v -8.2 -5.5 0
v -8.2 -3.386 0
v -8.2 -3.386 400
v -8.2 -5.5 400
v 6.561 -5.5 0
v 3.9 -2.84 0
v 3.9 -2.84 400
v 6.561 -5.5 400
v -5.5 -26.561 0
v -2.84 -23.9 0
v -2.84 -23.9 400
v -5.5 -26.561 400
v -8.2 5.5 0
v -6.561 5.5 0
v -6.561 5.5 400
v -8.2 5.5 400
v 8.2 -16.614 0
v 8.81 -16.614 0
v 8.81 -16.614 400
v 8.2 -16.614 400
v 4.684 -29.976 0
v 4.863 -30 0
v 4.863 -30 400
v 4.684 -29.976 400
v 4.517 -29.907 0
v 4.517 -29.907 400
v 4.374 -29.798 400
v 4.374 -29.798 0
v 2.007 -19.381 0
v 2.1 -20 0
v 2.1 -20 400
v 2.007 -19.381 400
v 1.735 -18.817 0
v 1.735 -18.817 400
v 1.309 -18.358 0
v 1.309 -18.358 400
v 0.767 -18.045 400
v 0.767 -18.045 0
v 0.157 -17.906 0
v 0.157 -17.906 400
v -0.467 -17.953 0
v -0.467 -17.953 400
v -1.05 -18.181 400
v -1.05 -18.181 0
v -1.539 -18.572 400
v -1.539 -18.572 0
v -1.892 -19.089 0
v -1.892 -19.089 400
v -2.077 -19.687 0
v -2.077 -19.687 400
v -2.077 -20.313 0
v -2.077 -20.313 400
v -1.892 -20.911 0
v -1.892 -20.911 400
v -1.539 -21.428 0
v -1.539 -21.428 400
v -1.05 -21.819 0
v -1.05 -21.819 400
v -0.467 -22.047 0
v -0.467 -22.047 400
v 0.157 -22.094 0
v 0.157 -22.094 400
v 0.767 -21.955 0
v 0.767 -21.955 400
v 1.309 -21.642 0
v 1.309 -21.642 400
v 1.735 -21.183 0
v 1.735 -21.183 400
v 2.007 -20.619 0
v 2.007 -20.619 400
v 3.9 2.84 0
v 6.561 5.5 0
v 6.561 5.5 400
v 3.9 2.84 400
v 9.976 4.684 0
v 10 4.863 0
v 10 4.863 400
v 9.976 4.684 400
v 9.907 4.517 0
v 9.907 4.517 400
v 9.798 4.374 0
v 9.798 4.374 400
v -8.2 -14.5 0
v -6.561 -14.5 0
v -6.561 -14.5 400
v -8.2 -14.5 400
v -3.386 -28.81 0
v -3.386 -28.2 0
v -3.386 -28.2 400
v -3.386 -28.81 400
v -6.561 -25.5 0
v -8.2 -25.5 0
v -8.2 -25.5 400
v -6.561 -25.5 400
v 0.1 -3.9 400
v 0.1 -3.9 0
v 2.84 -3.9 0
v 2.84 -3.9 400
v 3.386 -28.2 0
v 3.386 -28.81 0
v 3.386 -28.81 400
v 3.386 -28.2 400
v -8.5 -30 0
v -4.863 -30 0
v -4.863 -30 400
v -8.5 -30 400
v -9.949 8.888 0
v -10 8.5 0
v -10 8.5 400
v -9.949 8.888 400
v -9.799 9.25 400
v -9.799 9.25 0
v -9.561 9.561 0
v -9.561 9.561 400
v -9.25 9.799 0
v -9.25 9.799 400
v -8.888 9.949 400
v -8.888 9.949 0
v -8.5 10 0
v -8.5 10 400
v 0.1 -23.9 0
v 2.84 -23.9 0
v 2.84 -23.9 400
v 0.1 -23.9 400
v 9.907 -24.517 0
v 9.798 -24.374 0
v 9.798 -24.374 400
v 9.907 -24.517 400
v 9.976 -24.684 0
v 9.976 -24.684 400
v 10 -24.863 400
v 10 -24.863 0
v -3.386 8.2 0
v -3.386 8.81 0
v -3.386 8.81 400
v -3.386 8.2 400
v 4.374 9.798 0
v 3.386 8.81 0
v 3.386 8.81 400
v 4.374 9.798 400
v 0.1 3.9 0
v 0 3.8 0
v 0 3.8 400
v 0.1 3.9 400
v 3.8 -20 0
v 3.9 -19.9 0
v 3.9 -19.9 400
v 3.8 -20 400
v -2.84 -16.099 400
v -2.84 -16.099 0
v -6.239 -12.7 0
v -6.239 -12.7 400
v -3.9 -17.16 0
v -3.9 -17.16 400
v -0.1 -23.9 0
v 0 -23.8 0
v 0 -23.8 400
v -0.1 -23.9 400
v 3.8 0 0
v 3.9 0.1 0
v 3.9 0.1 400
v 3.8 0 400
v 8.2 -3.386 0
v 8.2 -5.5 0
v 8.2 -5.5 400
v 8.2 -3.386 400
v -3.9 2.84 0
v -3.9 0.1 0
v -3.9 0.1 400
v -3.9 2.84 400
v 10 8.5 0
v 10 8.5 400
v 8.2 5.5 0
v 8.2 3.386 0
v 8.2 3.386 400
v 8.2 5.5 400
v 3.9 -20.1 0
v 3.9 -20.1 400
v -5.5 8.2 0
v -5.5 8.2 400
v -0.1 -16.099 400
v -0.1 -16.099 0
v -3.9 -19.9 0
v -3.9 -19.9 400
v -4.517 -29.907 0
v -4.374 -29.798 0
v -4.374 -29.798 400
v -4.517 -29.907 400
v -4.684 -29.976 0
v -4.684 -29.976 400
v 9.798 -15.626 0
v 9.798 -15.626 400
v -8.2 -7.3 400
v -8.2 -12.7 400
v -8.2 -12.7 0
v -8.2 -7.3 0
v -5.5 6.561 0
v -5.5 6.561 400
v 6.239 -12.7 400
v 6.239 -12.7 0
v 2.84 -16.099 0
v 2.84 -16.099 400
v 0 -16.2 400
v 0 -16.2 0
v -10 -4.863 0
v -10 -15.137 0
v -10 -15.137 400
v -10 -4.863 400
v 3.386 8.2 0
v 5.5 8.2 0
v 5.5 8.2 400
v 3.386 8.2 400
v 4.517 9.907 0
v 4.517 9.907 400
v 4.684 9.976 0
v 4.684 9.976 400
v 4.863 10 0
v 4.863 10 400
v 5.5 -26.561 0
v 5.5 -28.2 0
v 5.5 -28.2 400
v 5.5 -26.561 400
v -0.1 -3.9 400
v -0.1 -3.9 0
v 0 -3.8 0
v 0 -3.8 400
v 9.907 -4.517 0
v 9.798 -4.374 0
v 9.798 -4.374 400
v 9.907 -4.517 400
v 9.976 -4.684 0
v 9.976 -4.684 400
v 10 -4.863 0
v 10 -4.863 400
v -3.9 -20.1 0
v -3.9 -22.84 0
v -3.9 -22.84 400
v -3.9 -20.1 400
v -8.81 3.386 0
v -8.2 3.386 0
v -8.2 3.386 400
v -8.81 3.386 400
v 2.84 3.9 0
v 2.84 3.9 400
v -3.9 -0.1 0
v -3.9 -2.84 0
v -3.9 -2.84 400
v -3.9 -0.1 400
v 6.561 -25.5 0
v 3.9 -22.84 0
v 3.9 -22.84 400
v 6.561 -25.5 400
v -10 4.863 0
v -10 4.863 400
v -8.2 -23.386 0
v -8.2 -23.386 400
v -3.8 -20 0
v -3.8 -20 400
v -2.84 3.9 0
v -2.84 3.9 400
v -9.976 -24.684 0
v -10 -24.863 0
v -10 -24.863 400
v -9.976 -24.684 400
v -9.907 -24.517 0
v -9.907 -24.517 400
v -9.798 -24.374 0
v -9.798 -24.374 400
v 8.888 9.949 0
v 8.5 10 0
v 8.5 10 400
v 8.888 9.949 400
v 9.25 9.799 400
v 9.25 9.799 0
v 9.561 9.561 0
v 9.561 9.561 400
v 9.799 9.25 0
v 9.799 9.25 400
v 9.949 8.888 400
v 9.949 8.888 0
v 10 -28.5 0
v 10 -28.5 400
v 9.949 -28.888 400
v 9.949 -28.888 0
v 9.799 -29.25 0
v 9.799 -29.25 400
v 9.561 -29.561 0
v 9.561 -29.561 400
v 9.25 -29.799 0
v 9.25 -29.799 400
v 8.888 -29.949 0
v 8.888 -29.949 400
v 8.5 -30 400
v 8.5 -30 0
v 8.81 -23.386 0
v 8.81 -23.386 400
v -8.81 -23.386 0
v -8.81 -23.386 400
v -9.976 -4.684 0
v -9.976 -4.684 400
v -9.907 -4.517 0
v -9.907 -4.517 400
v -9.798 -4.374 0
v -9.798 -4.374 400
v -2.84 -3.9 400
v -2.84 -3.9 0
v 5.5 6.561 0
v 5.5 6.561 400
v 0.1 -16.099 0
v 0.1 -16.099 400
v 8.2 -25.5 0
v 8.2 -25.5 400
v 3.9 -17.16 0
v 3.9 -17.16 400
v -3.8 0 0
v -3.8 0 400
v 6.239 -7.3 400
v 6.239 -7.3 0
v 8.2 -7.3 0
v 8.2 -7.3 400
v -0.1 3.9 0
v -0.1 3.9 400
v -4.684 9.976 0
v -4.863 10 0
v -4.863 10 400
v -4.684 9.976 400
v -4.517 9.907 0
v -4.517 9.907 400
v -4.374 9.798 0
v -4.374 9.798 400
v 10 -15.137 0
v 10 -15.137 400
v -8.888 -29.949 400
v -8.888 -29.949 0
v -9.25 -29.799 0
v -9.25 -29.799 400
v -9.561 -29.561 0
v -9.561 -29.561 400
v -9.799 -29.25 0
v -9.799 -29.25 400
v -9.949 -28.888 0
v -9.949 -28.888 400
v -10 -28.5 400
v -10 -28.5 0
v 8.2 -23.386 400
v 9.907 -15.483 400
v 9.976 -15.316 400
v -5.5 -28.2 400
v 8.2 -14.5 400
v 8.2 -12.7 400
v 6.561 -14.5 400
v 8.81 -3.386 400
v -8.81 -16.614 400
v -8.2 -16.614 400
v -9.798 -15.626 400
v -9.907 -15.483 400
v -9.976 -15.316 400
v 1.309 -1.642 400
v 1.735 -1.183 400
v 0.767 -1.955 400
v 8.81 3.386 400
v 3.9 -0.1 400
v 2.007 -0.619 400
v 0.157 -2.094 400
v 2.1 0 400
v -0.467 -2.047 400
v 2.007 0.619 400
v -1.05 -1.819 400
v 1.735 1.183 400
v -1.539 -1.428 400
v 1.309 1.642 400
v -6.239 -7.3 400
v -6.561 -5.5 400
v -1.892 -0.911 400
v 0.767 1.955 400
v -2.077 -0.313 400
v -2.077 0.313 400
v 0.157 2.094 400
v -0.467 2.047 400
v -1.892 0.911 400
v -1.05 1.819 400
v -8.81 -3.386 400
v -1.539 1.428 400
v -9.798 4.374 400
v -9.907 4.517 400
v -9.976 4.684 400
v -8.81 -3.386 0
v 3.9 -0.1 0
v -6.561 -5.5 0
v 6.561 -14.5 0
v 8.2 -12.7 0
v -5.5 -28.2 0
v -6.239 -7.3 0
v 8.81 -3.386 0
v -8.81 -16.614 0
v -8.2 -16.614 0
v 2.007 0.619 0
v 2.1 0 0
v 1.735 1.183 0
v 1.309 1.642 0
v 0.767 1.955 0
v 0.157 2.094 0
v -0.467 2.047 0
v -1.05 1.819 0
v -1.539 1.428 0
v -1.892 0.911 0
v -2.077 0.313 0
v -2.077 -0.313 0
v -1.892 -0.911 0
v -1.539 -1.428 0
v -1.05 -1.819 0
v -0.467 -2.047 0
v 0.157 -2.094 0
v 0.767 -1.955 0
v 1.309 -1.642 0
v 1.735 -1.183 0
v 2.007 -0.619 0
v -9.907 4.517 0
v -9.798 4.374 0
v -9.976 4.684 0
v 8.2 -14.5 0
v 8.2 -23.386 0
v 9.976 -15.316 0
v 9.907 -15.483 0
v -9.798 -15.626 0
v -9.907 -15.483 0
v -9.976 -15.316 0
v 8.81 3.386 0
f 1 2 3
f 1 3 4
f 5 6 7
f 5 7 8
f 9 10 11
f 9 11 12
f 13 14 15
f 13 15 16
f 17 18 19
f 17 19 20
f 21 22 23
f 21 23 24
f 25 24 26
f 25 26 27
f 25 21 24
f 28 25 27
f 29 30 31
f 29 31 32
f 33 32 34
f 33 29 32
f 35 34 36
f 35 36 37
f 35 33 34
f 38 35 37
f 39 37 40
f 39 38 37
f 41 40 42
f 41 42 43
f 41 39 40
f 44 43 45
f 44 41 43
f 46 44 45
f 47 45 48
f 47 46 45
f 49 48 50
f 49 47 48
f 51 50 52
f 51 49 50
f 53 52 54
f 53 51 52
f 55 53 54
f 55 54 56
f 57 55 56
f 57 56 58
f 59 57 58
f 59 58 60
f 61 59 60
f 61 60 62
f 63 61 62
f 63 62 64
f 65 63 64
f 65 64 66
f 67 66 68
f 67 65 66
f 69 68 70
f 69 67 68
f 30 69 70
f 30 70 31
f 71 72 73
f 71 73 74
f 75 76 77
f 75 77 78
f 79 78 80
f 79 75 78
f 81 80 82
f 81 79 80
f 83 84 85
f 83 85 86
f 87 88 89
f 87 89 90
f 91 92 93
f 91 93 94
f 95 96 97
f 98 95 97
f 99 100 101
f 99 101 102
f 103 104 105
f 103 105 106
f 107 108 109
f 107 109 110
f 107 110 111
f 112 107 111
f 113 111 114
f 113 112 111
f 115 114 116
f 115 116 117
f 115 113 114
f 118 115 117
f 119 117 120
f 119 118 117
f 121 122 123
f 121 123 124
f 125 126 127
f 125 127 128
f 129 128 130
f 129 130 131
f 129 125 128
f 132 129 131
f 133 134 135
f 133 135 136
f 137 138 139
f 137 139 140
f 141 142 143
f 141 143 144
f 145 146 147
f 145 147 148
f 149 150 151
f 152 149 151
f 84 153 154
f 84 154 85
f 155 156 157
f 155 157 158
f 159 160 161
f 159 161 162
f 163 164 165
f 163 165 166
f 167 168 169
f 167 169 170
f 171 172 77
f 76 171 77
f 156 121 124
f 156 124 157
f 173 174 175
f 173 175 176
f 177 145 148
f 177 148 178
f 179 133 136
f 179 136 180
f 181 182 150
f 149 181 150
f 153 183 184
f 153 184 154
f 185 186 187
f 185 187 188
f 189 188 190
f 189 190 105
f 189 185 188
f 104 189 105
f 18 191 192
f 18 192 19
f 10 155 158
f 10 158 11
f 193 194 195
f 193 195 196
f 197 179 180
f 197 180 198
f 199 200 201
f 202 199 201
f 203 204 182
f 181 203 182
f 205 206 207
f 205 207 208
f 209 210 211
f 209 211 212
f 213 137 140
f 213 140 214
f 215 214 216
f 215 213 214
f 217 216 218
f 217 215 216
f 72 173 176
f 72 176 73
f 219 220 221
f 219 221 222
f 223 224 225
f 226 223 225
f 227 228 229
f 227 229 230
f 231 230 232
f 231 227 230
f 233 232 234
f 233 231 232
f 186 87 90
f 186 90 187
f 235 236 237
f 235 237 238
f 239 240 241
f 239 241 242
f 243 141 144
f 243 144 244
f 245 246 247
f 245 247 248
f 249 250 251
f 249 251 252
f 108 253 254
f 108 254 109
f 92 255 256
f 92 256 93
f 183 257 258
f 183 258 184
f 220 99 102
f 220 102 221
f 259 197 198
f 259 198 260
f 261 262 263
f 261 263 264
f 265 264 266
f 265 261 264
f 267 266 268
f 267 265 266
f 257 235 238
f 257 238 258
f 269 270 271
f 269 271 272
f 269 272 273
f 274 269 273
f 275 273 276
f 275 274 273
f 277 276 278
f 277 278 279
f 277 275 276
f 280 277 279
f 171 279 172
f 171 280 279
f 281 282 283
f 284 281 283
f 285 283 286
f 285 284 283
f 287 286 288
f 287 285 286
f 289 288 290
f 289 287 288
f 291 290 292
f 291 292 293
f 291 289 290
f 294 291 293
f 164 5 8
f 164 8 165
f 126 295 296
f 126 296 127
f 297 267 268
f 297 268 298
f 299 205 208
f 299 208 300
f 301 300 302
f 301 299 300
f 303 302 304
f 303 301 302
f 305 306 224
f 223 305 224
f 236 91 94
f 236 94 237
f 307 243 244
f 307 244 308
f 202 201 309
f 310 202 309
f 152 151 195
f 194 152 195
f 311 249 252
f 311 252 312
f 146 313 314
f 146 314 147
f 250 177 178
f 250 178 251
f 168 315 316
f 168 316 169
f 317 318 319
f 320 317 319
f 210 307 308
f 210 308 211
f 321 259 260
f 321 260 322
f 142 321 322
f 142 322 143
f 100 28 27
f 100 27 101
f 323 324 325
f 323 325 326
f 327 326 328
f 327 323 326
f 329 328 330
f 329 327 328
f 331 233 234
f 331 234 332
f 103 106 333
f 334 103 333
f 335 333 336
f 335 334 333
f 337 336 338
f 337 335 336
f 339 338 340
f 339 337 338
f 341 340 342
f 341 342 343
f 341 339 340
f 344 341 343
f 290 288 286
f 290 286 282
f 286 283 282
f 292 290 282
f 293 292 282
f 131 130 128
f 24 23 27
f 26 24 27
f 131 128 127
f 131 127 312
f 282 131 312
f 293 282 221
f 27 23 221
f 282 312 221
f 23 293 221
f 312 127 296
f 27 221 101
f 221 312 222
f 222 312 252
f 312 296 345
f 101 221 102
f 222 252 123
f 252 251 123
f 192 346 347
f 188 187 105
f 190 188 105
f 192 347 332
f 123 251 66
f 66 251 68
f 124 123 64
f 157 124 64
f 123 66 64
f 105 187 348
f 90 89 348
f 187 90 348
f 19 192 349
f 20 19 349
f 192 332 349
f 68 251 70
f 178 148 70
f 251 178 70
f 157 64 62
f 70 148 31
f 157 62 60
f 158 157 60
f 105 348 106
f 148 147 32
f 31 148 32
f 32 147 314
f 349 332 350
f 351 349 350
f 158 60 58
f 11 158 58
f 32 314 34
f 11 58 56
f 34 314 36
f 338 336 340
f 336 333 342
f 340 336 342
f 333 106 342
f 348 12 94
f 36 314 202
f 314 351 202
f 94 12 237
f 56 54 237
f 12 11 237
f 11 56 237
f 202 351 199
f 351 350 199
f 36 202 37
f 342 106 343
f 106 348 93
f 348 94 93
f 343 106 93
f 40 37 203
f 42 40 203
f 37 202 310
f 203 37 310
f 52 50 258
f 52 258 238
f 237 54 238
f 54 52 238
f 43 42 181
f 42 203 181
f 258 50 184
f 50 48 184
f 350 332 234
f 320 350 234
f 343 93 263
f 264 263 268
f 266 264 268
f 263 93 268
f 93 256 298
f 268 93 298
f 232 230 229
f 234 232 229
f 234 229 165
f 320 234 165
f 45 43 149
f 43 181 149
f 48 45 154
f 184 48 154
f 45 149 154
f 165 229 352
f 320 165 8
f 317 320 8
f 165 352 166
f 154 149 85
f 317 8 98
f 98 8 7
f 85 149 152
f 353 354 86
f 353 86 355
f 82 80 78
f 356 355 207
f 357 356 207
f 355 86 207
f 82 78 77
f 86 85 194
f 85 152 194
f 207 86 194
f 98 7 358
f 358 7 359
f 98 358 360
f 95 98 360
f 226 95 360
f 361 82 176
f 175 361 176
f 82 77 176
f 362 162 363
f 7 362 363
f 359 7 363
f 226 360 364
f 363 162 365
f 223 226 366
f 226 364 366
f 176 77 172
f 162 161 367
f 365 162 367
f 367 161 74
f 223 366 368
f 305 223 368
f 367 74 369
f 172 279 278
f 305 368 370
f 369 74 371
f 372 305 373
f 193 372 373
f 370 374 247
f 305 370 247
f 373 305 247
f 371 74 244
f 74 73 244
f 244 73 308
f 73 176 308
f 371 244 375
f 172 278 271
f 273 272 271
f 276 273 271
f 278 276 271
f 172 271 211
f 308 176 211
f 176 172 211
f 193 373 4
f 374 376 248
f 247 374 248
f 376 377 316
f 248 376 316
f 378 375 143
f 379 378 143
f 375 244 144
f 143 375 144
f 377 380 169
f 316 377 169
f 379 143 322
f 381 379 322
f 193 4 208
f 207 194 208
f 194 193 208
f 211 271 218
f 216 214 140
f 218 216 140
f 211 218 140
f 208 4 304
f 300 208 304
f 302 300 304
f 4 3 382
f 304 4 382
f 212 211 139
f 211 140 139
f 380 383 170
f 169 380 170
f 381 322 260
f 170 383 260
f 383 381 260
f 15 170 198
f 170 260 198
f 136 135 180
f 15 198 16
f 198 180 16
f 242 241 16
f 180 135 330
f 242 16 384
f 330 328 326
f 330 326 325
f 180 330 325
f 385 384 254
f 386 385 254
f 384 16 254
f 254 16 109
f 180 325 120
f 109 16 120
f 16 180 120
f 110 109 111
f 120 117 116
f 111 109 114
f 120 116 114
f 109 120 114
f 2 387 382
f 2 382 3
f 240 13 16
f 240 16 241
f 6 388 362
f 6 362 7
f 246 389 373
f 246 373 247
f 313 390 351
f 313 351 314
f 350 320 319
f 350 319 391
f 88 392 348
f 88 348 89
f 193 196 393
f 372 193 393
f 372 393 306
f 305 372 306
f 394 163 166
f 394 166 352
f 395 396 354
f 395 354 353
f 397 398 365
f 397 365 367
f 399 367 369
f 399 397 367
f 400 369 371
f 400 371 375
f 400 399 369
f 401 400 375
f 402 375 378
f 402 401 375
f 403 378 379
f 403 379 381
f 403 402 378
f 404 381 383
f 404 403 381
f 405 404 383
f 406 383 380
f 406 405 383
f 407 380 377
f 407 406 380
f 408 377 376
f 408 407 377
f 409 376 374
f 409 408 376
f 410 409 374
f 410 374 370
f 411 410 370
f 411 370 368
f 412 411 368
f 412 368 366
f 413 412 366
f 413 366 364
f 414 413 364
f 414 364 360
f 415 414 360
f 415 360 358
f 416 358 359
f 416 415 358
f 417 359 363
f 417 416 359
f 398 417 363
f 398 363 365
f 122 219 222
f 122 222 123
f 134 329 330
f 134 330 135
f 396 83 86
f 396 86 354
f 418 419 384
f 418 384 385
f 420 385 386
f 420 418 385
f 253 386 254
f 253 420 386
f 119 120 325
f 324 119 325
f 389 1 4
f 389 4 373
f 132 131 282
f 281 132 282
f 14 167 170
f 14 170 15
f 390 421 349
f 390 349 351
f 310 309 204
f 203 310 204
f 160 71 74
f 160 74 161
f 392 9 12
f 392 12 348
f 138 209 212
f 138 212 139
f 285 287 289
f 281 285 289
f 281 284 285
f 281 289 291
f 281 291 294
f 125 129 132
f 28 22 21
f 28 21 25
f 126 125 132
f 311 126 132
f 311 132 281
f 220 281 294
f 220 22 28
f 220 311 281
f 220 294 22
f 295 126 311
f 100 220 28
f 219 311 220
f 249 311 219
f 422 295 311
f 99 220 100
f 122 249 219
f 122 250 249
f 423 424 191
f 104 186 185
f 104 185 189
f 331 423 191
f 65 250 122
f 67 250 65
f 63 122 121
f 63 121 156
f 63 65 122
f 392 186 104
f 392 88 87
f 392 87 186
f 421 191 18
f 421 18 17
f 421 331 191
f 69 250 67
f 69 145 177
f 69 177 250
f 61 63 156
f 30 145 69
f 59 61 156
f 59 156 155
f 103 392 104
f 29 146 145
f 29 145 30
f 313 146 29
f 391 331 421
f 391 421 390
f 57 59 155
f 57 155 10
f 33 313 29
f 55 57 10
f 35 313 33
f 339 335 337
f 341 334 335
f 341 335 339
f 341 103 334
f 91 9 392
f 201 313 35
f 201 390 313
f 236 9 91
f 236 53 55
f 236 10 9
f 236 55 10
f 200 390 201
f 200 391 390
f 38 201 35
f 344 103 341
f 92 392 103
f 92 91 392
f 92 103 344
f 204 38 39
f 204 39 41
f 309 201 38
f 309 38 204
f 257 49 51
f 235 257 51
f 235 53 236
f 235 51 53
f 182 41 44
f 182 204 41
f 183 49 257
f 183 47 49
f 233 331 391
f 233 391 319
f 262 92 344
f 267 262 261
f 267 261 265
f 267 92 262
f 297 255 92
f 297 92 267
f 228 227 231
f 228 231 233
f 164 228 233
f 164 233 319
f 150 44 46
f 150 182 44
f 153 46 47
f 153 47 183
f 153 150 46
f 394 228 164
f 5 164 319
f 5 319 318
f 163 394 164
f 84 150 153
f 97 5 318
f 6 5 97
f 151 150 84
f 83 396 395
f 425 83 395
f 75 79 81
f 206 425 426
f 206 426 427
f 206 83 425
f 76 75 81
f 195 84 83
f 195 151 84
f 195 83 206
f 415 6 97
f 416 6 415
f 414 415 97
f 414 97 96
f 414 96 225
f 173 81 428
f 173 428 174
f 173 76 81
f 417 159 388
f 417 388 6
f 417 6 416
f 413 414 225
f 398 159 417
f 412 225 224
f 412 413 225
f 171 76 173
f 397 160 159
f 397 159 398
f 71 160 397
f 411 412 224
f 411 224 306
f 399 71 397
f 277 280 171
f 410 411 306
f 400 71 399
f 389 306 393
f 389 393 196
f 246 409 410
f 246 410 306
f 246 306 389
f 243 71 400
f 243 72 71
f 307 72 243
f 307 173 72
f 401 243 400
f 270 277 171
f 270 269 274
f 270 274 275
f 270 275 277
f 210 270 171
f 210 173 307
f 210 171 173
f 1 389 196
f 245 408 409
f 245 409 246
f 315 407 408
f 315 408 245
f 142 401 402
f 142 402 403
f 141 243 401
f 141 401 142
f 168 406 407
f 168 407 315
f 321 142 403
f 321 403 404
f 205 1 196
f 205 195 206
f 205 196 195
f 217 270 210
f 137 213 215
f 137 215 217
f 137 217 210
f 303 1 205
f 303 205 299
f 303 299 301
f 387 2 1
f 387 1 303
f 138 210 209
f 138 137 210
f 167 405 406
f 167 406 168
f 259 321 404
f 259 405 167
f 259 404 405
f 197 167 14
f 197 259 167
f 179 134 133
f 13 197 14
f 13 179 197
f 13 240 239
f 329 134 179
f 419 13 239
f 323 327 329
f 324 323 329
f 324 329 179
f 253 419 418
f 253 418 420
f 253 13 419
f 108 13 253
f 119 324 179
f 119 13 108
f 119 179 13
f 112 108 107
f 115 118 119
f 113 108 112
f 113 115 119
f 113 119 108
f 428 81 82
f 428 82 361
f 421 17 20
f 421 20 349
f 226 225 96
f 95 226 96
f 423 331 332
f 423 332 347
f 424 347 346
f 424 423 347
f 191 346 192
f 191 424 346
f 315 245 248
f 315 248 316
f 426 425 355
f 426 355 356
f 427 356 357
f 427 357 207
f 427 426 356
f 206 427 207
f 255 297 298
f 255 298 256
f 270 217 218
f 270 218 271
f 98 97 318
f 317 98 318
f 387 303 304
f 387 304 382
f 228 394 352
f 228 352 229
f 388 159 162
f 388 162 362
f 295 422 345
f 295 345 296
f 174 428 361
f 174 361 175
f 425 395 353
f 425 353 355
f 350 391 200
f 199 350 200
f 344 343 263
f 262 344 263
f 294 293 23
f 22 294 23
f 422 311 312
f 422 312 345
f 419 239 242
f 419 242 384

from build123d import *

# Parameters (mm, degrees)
SKETCH1_R           = 2.1
BOSS_EXTRUDE2_DEPTH = 400


with BuildPart() as part:
    # Sketch1 → Boss-Extrude2 (new body)
    with BuildSketch(Plane.XY):
        with BuildLine():
            Line((-8.5, 10), (-4.862792737, 10))
            ThreePointArc((-4.862792737, 10), (-4.598292737, 9.947387679), (-4.374060464, 9.797560464))
            Line((-4.374060464, 9.797560464), (-3.3865, 8.81))
            Line((-3.3865, 8.81), (-3.3865, 8.2))
            Line((-3.3865, 8.2), (-5.5, 8.2))
            Line((-5.5, 8.2), (-5.5, 6.561))
            Line((-5.5, 6.561), (-2.8395, 3.9005))
            Line((-2.8395, 3.9005), (-0.1, 3.9005))
            Line((-0.1, 3.9005), (0, 3.8005))
            Line((0, 3.8005), (0.1, 3.9005))
            Line((0.1, 3.9005), (2.8395, 3.9005))
            Line((2.8395, 3.9005), (5.5, 6.561))
            Line((5.5, 6.561), (5.5, 8.2))
            Line((5.5, 8.2), (3.3865, 8.2))
            Line((3.3865, 8.2), (3.3865, 8.81))
            Line((3.3865, 8.81), (4.374060464, 9.797560464))
            ThreePointArc((4.374060464, 9.797560464), (4.598292737, 9.947387679), (4.862792737, 10))
            Line((4.862792737, 10), (8.5, 10))
            ThreePointArc((8.5, 10), (9.560660172, 9.560660172), (10, 8.5))
            Line((10, 8.5), (10, 4.862792737))
            ThreePointArc((10, 4.862792737), (9.947387679, 4.598292737), (9.797560464, 4.374060464))
            Line((9.797560464, 4.374060464), (8.81, 3.3865))
            Line((8.81, 3.3865), (8.2, 3.3865))
            Line((8.2, 3.3865), (8.2, 5.5))
            Line((8.2, 5.5), (6.561, 5.5))
            Line((6.561, 5.5), (3.9005, 2.8395))
            Line((3.9005, 2.8395), (3.9005, 0.1))
            Line((3.9005, 0.1), (3.8005, 0))
            Line((3.8005, 0), (3.9005, -0.1))
            Line((3.9005, -0.1), (3.9005, -2.8395))
            Line((3.9005, -2.8395), (6.561, -5.5))
            Line((6.561, -5.5), (8.2, -5.5))
            Line((8.2, -5.5), (8.2, -3.3865))
            Line((8.2, -3.3865), (8.81, -3.3865))
            Line((8.81, -3.3865), (9.797560464, -4.374060464))
            ThreePointArc((9.797560464, -4.374060464), (9.947387679, -4.598292737), (10, -4.862792737))
            Line((10, -4.862792737), (10, -15.137207263))
            ThreePointArc((10, -15.137207263), (9.947387679, -15.401707263), (9.797560464, -15.625939536))
            Line((9.797560464, -15.625939536), (8.81, -16.6135))
            Line((8.81, -16.6135), (8.2, -16.6135))
            Line((8.2, -16.6135), (8.2, -14.5))
            Line((8.2, -14.5), (6.561, -14.5))
            Line((6.561, -14.5), (3.9005, -17.1605))
            Line((3.9005, -17.1605), (3.9005, -19.9))
            Line((3.9005, -19.9), (3.8005, -20))
            Line((3.8005, -20), (3.9005, -20.1))
            Line((3.9005, -20.1), (3.9005, -22.8395))
            Line((3.9005, -22.8395), (6.561, -25.5))
            Line((6.561, -25.5), (8.2, -25.5))
            Line((8.2, -25.5), (8.2, -23.3865))
            Line((8.2, -23.3865), (8.81, -23.3865))
            Line((8.81, -23.3865), (9.797560464, -24.374060464))
            ThreePointArc((9.797560464, -24.374060464), (9.947387679, -24.598292737), (10, -24.862792737))
            Line((10, -24.862792737), (10, -28.5))
            ThreePointArc((10, -28.5), (9.560660172, -29.560660172), (8.5, -30))
            Line((8.5, -30), (4.862792737, -30))
            ThreePointArc((4.862792737, -30), (4.598292737, -29.947387679), (4.374060464, -29.797560464))
            Line((4.374060464, -29.797560464), (3.3865, -28.81))
            Line((3.3865, -28.81), (3.3865, -28.2))
            Line((3.3865, -28.2), (5.5, -28.2))
            Line((5.5, -28.2), (5.5, -26.561))
            Line((5.5, -26.561), (2.8395, -23.9005))
            Line((2.8395, -23.9005), (0.1, -23.9005))
            Line((0.1, -23.9005), (0, -23.8005))
            Line((0, -23.8005), (-0.1, -23.9005))
            Line((-0.1, -23.9005), (-2.8395, -23.9005))
            Line((-2.8395, -23.9005), (-5.5, -26.561))
            Line((-5.5, -26.561), (-5.5, -28.2))
            Line((-5.5, -28.2), (-3.3865, -28.2))
            Line((-3.3865, -28.2), (-3.3865, -28.81))
            Line((-3.3865, -28.81), (-4.374060464, -29.797560464))
            ThreePointArc((-4.374060464, -29.797560464), (-4.598292737, -29.947387679), (-4.862792737, -30))
            Line((-4.862792737, -30), (-8.5, -30))
            ThreePointArc((-8.5, -30), (-9.560660172, -29.560660172), (-10, -28.5))
            Line((-10, -28.5), (-10, -24.862792737))
            ThreePointArc((-10, -24.862792737), (-9.947387679, -24.598292737), (-9.797560464, -24.374060464))
            Line((-9.797560464, -24.374060464), (-8.81, -23.3865))
            Line((-8.81, -23.3865), (-8.2, -23.3865))
            Line((-8.2, -23.3865), (-8.2, -25.5))
            Line((-8.2, -25.5), (-6.561, -25.5))
            Line((-6.561, -25.5), (-3.9005, -22.8395))
            Line((-3.9005, -22.8395), (-3.9005, -20.1))
            Line((-3.9005, -20.1), (-3.8005, -20))
            Line((-3.8005, -20), (-3.9005, -19.9))
            Line((-3.9005, -19.9), (-3.9005, -17.1605))
            Line((-3.9005, -17.1605), (-6.561, -14.5))
            Line((-6.561, -14.5), (-8.2, -14.5))
            Line((-8.2, -14.5), (-8.2, -16.6135))
            Line((-8.2, -16.6135), (-8.81, -16.6135))
            Line((-8.81, -16.6135), (-9.797560464, -15.625939536))
            ThreePointArc((-9.797560464, -15.625939536), (-9.947387679, -15.401707263), (-10, -15.137207263))
            Line((-10, -15.137207263), (-10, -4.862792737))
            ThreePointArc((-10, -4.862792737), (-9.947387679, -4.598292737), (-9.797560464, -4.374060464))
            Line((-9.797560464, -4.374060464), (-8.81, -3.3865))
            Line((-8.81, -3.3865), (-8.2, -3.3865))
            Line((-8.2, -3.3865), (-8.2, -5.5))
            Line((-8.2, -5.5), (-6.561, -5.5))
            Line((-6.561, -5.5), (-3.9005, -2.8395))
            Line((-3.9005, -2.8395), (-3.9005, -0.1))
            Line((-3.9005, -0.1), (-3.8005, 0))
            Line((-3.8005, 0), (-3.9005, 0.1))
            Line((-3.9005, 0.1), (-3.9005, 2.8395))
            Line((-3.9005, 2.8395), (-6.561, 5.5))
            Line((-6.561, 5.5), (-8.2, 5.5))
            Line((-8.2, 5.5), (-8.2, 3.3865))
            Line((-8.2, 3.3865), (-8.81, 3.3865))
            Line((-8.81, 3.3865), (-9.797560464, 4.374060464))
            ThreePointArc((-9.797560464, 4.374060464), (-9.947387679, 4.598292737), (-10, 4.862792737))
            Line((-10, 4.862792737), (-10, 8.5))
            ThreePointArc((-10, 8.5), (-9.560660172, 9.560660172), (-8.5, 10))
        make_face()
        Circle(SKETCH1_R, mode=Mode.SUBTRACT)
        with Locations((0, -20)):
            Circle(SKETCH1_R, mode=Mode.SUBTRACT)
        Polygon((-8.2, -12.7), (-8.2, -7.3), (-6.239, -7.3), (-5.5, -6.561), (-2.8395, -3.9005), (-0.1, -3.9005), (0, -3.8005), (0.1, -3.9005), (2.8395, -3.9005), (5.5, -6.561), (6.239, -7.3), (8.2, -7.3), (8.2, -12.7), (6.239, -12.7), (5.5, -13.439), (2.8395, -16.0995), (0.1, -16.0995), (0, -16.1995), (-0.1, -16.0995), (-2.8395, -16.0995), (-5.5, -13.439), (-6.239, -12.7), align=None, mode=Mode.SUBTRACT)
    extrude(amount=BOSS_EXTRUDE2_DEPTH)


solid = part.part
